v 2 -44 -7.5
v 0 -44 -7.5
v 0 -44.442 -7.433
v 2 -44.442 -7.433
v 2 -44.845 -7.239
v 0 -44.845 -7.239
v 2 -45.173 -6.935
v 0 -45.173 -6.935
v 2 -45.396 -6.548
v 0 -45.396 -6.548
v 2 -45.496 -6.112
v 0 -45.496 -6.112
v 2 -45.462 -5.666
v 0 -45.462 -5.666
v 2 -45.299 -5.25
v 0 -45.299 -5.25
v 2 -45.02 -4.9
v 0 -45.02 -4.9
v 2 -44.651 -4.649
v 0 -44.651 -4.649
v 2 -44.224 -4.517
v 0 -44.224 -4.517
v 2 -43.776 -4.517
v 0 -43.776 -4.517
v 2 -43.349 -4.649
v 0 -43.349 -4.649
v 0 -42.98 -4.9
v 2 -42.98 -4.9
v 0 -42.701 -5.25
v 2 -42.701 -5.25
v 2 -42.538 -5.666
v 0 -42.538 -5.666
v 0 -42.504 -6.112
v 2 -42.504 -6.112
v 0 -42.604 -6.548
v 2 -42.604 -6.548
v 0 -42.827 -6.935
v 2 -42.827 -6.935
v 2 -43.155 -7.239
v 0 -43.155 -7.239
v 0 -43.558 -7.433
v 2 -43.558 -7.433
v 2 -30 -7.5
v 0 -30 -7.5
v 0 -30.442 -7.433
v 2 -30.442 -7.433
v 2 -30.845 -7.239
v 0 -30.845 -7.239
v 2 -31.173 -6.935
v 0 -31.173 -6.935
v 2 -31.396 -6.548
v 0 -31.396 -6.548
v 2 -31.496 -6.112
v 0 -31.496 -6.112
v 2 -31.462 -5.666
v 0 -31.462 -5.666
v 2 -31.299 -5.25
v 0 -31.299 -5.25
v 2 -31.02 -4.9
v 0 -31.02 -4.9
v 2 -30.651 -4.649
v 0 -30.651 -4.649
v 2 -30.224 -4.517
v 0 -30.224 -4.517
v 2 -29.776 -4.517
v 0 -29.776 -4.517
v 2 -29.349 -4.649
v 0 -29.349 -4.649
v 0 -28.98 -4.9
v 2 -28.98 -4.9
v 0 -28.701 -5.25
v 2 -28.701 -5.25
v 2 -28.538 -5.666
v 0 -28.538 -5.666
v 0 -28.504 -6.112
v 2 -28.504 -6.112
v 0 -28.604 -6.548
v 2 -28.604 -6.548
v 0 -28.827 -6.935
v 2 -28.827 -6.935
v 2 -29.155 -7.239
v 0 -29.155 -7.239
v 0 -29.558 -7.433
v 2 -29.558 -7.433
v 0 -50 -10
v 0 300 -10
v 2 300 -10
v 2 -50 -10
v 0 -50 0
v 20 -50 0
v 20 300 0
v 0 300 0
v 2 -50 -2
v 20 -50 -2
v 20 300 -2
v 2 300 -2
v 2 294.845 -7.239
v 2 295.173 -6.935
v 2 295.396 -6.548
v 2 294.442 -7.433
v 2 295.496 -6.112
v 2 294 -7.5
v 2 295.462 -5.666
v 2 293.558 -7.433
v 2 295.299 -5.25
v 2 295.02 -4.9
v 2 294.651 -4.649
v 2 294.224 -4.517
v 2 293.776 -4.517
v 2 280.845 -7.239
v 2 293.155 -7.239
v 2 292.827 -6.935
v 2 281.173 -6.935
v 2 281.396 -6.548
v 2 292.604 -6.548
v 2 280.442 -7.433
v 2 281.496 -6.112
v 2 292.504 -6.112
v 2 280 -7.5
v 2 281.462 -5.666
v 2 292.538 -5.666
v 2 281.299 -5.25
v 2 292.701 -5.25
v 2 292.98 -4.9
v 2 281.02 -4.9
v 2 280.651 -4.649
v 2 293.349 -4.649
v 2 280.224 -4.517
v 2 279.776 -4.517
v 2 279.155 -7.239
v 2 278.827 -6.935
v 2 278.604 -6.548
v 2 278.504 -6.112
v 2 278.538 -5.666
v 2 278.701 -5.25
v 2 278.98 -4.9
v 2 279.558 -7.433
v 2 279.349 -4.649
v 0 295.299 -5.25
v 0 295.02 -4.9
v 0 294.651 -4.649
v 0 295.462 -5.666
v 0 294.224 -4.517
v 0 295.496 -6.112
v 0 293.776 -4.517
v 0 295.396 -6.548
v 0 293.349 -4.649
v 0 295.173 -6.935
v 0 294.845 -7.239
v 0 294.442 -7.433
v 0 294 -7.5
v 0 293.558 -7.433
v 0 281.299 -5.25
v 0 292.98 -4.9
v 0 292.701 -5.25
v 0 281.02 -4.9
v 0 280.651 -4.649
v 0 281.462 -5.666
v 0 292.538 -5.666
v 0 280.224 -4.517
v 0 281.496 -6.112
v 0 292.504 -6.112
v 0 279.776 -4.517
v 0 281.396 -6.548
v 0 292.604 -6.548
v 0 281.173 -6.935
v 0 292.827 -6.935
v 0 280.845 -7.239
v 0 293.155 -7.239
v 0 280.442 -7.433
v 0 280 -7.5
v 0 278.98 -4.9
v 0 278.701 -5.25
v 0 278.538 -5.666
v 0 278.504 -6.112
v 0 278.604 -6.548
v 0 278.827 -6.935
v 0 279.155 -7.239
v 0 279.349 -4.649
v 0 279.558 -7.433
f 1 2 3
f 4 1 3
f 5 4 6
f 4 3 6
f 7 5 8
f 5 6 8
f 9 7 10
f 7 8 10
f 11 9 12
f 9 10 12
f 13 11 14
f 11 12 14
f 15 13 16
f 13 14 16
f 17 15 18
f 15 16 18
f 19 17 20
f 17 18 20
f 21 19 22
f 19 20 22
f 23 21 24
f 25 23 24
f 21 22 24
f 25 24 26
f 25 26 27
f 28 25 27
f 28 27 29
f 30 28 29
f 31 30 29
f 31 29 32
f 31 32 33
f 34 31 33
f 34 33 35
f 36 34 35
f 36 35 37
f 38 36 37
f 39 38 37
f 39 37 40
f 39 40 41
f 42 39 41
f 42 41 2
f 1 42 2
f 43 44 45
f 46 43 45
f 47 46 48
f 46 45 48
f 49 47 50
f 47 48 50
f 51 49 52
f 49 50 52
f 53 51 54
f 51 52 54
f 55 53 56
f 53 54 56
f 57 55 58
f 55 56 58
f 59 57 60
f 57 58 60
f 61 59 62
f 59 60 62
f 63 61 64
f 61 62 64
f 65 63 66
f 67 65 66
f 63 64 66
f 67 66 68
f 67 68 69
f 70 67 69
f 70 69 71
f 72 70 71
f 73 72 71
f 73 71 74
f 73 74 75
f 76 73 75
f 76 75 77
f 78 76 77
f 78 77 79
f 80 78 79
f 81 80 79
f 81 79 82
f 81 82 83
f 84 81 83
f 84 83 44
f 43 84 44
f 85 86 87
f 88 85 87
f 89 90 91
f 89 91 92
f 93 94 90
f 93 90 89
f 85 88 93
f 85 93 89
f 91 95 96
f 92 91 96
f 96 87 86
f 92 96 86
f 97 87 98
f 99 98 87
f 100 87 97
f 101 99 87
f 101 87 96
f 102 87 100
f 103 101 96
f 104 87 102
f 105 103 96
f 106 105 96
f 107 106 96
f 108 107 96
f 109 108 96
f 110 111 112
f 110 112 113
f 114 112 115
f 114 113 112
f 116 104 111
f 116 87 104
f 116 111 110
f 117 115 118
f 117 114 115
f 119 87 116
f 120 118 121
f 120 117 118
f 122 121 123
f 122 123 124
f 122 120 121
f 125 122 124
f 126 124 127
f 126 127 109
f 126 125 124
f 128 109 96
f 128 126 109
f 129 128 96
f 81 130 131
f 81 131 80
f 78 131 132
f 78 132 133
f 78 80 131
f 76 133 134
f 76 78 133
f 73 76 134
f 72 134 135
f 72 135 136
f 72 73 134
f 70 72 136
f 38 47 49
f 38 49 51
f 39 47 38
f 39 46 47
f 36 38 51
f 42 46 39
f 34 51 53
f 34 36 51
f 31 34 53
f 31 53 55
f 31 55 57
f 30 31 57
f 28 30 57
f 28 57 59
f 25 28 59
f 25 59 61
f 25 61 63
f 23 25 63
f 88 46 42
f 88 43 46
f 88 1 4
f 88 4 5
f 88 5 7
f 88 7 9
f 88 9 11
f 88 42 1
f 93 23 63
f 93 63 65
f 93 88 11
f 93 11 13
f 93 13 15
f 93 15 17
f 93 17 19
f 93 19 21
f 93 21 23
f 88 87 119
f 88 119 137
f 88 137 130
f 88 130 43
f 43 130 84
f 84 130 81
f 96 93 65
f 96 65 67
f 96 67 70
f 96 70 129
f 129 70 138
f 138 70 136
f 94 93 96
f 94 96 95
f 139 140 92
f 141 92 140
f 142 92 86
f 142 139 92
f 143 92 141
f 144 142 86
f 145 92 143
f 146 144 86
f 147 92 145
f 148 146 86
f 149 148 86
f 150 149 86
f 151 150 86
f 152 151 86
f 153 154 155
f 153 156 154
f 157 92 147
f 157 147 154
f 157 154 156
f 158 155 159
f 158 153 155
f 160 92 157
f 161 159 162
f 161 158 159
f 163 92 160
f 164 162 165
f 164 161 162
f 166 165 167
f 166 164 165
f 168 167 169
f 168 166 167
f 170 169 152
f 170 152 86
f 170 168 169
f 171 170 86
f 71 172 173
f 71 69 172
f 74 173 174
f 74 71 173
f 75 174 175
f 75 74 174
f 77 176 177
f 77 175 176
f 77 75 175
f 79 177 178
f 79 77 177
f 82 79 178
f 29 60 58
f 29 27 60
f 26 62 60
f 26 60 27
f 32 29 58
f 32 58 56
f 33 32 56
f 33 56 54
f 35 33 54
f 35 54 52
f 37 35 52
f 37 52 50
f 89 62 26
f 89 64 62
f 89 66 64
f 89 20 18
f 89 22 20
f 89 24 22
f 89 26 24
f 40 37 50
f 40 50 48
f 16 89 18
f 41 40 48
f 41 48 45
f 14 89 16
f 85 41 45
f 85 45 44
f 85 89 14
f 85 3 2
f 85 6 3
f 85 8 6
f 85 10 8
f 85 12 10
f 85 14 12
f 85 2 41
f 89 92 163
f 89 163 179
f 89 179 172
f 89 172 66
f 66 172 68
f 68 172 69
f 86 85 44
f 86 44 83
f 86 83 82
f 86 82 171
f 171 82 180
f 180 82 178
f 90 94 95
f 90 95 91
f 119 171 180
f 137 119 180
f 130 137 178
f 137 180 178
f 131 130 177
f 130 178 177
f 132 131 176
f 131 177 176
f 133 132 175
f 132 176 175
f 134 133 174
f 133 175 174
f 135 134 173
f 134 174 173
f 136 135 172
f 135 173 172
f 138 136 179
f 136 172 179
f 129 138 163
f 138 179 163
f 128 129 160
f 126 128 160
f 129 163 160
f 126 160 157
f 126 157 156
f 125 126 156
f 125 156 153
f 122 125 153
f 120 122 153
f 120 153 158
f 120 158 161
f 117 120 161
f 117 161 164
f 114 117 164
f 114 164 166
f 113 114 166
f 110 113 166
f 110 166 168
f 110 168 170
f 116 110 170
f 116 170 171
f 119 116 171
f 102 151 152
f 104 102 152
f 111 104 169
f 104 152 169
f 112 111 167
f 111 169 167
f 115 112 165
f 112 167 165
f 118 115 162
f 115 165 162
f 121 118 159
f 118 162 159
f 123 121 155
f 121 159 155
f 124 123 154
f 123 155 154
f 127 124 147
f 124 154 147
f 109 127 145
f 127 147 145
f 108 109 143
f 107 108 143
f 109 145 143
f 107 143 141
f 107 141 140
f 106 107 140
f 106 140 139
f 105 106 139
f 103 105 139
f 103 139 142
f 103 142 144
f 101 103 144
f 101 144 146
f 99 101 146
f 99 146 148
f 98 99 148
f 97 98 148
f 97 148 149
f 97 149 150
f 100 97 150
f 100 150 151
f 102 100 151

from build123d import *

# Parameters (mm, degrees)
BOSS_EXTRUDE1_DEPTH      = 300
BOSS_EXTRUDE1_DEPTH_BACK = 50
F_3_0_3_DIAMETER_HOLE3_D = 3
F_3_0_3_DIAMETER_HOLE4_D = 3


with BuildPart() as part:
    # Sketch1 → Boss-Extrude1 (new, two sides: drawn at the far end of the back side and taken through both)
    with BuildSketch(Plane(origin=(0, 0, 0), x_dir=(1, 0, 0), z_dir=(0, 1, 0)).offset(-BOSS_EXTRUDE1_DEPTH_BACK)):
        Polygon((0, 0), (0, 10), (2, 10), (2, 2), (20, 2), (20, 0), align=None)
    extrude(amount=BOSS_EXTRUDE1_DEPTH + BOSS_EXTRUDE1_DEPTH_BACK)

    # Ø3.0 (3) Diameter Hole3 (through all)
    with Locations(Plane(origin=(2, 311.407632793, -241.32004832), x_dir=(0, 0, 1), z_dir=(1, 0, 0))):
        with Locations((235.32004832, 355.407632793), (235.32004832, 341.407632793)):
            Hole(F_3_0_3_DIAMETER_HOLE3_D / 2)

    # Ø3.0 (3) Diameter Hole4 (through all)
    with Locations(Plane(origin=(2, 311.407632793, -241.32004832), x_dir=(0, 0, 1), z_dir=(1, 0, 0))):
        with Locations((235.32004832, 17.407632793), (235.32004832, 31.407632793)):
            Hole(F_3_0_3_DIAMETER_HOLE4_D / 2)


solid = part.part
